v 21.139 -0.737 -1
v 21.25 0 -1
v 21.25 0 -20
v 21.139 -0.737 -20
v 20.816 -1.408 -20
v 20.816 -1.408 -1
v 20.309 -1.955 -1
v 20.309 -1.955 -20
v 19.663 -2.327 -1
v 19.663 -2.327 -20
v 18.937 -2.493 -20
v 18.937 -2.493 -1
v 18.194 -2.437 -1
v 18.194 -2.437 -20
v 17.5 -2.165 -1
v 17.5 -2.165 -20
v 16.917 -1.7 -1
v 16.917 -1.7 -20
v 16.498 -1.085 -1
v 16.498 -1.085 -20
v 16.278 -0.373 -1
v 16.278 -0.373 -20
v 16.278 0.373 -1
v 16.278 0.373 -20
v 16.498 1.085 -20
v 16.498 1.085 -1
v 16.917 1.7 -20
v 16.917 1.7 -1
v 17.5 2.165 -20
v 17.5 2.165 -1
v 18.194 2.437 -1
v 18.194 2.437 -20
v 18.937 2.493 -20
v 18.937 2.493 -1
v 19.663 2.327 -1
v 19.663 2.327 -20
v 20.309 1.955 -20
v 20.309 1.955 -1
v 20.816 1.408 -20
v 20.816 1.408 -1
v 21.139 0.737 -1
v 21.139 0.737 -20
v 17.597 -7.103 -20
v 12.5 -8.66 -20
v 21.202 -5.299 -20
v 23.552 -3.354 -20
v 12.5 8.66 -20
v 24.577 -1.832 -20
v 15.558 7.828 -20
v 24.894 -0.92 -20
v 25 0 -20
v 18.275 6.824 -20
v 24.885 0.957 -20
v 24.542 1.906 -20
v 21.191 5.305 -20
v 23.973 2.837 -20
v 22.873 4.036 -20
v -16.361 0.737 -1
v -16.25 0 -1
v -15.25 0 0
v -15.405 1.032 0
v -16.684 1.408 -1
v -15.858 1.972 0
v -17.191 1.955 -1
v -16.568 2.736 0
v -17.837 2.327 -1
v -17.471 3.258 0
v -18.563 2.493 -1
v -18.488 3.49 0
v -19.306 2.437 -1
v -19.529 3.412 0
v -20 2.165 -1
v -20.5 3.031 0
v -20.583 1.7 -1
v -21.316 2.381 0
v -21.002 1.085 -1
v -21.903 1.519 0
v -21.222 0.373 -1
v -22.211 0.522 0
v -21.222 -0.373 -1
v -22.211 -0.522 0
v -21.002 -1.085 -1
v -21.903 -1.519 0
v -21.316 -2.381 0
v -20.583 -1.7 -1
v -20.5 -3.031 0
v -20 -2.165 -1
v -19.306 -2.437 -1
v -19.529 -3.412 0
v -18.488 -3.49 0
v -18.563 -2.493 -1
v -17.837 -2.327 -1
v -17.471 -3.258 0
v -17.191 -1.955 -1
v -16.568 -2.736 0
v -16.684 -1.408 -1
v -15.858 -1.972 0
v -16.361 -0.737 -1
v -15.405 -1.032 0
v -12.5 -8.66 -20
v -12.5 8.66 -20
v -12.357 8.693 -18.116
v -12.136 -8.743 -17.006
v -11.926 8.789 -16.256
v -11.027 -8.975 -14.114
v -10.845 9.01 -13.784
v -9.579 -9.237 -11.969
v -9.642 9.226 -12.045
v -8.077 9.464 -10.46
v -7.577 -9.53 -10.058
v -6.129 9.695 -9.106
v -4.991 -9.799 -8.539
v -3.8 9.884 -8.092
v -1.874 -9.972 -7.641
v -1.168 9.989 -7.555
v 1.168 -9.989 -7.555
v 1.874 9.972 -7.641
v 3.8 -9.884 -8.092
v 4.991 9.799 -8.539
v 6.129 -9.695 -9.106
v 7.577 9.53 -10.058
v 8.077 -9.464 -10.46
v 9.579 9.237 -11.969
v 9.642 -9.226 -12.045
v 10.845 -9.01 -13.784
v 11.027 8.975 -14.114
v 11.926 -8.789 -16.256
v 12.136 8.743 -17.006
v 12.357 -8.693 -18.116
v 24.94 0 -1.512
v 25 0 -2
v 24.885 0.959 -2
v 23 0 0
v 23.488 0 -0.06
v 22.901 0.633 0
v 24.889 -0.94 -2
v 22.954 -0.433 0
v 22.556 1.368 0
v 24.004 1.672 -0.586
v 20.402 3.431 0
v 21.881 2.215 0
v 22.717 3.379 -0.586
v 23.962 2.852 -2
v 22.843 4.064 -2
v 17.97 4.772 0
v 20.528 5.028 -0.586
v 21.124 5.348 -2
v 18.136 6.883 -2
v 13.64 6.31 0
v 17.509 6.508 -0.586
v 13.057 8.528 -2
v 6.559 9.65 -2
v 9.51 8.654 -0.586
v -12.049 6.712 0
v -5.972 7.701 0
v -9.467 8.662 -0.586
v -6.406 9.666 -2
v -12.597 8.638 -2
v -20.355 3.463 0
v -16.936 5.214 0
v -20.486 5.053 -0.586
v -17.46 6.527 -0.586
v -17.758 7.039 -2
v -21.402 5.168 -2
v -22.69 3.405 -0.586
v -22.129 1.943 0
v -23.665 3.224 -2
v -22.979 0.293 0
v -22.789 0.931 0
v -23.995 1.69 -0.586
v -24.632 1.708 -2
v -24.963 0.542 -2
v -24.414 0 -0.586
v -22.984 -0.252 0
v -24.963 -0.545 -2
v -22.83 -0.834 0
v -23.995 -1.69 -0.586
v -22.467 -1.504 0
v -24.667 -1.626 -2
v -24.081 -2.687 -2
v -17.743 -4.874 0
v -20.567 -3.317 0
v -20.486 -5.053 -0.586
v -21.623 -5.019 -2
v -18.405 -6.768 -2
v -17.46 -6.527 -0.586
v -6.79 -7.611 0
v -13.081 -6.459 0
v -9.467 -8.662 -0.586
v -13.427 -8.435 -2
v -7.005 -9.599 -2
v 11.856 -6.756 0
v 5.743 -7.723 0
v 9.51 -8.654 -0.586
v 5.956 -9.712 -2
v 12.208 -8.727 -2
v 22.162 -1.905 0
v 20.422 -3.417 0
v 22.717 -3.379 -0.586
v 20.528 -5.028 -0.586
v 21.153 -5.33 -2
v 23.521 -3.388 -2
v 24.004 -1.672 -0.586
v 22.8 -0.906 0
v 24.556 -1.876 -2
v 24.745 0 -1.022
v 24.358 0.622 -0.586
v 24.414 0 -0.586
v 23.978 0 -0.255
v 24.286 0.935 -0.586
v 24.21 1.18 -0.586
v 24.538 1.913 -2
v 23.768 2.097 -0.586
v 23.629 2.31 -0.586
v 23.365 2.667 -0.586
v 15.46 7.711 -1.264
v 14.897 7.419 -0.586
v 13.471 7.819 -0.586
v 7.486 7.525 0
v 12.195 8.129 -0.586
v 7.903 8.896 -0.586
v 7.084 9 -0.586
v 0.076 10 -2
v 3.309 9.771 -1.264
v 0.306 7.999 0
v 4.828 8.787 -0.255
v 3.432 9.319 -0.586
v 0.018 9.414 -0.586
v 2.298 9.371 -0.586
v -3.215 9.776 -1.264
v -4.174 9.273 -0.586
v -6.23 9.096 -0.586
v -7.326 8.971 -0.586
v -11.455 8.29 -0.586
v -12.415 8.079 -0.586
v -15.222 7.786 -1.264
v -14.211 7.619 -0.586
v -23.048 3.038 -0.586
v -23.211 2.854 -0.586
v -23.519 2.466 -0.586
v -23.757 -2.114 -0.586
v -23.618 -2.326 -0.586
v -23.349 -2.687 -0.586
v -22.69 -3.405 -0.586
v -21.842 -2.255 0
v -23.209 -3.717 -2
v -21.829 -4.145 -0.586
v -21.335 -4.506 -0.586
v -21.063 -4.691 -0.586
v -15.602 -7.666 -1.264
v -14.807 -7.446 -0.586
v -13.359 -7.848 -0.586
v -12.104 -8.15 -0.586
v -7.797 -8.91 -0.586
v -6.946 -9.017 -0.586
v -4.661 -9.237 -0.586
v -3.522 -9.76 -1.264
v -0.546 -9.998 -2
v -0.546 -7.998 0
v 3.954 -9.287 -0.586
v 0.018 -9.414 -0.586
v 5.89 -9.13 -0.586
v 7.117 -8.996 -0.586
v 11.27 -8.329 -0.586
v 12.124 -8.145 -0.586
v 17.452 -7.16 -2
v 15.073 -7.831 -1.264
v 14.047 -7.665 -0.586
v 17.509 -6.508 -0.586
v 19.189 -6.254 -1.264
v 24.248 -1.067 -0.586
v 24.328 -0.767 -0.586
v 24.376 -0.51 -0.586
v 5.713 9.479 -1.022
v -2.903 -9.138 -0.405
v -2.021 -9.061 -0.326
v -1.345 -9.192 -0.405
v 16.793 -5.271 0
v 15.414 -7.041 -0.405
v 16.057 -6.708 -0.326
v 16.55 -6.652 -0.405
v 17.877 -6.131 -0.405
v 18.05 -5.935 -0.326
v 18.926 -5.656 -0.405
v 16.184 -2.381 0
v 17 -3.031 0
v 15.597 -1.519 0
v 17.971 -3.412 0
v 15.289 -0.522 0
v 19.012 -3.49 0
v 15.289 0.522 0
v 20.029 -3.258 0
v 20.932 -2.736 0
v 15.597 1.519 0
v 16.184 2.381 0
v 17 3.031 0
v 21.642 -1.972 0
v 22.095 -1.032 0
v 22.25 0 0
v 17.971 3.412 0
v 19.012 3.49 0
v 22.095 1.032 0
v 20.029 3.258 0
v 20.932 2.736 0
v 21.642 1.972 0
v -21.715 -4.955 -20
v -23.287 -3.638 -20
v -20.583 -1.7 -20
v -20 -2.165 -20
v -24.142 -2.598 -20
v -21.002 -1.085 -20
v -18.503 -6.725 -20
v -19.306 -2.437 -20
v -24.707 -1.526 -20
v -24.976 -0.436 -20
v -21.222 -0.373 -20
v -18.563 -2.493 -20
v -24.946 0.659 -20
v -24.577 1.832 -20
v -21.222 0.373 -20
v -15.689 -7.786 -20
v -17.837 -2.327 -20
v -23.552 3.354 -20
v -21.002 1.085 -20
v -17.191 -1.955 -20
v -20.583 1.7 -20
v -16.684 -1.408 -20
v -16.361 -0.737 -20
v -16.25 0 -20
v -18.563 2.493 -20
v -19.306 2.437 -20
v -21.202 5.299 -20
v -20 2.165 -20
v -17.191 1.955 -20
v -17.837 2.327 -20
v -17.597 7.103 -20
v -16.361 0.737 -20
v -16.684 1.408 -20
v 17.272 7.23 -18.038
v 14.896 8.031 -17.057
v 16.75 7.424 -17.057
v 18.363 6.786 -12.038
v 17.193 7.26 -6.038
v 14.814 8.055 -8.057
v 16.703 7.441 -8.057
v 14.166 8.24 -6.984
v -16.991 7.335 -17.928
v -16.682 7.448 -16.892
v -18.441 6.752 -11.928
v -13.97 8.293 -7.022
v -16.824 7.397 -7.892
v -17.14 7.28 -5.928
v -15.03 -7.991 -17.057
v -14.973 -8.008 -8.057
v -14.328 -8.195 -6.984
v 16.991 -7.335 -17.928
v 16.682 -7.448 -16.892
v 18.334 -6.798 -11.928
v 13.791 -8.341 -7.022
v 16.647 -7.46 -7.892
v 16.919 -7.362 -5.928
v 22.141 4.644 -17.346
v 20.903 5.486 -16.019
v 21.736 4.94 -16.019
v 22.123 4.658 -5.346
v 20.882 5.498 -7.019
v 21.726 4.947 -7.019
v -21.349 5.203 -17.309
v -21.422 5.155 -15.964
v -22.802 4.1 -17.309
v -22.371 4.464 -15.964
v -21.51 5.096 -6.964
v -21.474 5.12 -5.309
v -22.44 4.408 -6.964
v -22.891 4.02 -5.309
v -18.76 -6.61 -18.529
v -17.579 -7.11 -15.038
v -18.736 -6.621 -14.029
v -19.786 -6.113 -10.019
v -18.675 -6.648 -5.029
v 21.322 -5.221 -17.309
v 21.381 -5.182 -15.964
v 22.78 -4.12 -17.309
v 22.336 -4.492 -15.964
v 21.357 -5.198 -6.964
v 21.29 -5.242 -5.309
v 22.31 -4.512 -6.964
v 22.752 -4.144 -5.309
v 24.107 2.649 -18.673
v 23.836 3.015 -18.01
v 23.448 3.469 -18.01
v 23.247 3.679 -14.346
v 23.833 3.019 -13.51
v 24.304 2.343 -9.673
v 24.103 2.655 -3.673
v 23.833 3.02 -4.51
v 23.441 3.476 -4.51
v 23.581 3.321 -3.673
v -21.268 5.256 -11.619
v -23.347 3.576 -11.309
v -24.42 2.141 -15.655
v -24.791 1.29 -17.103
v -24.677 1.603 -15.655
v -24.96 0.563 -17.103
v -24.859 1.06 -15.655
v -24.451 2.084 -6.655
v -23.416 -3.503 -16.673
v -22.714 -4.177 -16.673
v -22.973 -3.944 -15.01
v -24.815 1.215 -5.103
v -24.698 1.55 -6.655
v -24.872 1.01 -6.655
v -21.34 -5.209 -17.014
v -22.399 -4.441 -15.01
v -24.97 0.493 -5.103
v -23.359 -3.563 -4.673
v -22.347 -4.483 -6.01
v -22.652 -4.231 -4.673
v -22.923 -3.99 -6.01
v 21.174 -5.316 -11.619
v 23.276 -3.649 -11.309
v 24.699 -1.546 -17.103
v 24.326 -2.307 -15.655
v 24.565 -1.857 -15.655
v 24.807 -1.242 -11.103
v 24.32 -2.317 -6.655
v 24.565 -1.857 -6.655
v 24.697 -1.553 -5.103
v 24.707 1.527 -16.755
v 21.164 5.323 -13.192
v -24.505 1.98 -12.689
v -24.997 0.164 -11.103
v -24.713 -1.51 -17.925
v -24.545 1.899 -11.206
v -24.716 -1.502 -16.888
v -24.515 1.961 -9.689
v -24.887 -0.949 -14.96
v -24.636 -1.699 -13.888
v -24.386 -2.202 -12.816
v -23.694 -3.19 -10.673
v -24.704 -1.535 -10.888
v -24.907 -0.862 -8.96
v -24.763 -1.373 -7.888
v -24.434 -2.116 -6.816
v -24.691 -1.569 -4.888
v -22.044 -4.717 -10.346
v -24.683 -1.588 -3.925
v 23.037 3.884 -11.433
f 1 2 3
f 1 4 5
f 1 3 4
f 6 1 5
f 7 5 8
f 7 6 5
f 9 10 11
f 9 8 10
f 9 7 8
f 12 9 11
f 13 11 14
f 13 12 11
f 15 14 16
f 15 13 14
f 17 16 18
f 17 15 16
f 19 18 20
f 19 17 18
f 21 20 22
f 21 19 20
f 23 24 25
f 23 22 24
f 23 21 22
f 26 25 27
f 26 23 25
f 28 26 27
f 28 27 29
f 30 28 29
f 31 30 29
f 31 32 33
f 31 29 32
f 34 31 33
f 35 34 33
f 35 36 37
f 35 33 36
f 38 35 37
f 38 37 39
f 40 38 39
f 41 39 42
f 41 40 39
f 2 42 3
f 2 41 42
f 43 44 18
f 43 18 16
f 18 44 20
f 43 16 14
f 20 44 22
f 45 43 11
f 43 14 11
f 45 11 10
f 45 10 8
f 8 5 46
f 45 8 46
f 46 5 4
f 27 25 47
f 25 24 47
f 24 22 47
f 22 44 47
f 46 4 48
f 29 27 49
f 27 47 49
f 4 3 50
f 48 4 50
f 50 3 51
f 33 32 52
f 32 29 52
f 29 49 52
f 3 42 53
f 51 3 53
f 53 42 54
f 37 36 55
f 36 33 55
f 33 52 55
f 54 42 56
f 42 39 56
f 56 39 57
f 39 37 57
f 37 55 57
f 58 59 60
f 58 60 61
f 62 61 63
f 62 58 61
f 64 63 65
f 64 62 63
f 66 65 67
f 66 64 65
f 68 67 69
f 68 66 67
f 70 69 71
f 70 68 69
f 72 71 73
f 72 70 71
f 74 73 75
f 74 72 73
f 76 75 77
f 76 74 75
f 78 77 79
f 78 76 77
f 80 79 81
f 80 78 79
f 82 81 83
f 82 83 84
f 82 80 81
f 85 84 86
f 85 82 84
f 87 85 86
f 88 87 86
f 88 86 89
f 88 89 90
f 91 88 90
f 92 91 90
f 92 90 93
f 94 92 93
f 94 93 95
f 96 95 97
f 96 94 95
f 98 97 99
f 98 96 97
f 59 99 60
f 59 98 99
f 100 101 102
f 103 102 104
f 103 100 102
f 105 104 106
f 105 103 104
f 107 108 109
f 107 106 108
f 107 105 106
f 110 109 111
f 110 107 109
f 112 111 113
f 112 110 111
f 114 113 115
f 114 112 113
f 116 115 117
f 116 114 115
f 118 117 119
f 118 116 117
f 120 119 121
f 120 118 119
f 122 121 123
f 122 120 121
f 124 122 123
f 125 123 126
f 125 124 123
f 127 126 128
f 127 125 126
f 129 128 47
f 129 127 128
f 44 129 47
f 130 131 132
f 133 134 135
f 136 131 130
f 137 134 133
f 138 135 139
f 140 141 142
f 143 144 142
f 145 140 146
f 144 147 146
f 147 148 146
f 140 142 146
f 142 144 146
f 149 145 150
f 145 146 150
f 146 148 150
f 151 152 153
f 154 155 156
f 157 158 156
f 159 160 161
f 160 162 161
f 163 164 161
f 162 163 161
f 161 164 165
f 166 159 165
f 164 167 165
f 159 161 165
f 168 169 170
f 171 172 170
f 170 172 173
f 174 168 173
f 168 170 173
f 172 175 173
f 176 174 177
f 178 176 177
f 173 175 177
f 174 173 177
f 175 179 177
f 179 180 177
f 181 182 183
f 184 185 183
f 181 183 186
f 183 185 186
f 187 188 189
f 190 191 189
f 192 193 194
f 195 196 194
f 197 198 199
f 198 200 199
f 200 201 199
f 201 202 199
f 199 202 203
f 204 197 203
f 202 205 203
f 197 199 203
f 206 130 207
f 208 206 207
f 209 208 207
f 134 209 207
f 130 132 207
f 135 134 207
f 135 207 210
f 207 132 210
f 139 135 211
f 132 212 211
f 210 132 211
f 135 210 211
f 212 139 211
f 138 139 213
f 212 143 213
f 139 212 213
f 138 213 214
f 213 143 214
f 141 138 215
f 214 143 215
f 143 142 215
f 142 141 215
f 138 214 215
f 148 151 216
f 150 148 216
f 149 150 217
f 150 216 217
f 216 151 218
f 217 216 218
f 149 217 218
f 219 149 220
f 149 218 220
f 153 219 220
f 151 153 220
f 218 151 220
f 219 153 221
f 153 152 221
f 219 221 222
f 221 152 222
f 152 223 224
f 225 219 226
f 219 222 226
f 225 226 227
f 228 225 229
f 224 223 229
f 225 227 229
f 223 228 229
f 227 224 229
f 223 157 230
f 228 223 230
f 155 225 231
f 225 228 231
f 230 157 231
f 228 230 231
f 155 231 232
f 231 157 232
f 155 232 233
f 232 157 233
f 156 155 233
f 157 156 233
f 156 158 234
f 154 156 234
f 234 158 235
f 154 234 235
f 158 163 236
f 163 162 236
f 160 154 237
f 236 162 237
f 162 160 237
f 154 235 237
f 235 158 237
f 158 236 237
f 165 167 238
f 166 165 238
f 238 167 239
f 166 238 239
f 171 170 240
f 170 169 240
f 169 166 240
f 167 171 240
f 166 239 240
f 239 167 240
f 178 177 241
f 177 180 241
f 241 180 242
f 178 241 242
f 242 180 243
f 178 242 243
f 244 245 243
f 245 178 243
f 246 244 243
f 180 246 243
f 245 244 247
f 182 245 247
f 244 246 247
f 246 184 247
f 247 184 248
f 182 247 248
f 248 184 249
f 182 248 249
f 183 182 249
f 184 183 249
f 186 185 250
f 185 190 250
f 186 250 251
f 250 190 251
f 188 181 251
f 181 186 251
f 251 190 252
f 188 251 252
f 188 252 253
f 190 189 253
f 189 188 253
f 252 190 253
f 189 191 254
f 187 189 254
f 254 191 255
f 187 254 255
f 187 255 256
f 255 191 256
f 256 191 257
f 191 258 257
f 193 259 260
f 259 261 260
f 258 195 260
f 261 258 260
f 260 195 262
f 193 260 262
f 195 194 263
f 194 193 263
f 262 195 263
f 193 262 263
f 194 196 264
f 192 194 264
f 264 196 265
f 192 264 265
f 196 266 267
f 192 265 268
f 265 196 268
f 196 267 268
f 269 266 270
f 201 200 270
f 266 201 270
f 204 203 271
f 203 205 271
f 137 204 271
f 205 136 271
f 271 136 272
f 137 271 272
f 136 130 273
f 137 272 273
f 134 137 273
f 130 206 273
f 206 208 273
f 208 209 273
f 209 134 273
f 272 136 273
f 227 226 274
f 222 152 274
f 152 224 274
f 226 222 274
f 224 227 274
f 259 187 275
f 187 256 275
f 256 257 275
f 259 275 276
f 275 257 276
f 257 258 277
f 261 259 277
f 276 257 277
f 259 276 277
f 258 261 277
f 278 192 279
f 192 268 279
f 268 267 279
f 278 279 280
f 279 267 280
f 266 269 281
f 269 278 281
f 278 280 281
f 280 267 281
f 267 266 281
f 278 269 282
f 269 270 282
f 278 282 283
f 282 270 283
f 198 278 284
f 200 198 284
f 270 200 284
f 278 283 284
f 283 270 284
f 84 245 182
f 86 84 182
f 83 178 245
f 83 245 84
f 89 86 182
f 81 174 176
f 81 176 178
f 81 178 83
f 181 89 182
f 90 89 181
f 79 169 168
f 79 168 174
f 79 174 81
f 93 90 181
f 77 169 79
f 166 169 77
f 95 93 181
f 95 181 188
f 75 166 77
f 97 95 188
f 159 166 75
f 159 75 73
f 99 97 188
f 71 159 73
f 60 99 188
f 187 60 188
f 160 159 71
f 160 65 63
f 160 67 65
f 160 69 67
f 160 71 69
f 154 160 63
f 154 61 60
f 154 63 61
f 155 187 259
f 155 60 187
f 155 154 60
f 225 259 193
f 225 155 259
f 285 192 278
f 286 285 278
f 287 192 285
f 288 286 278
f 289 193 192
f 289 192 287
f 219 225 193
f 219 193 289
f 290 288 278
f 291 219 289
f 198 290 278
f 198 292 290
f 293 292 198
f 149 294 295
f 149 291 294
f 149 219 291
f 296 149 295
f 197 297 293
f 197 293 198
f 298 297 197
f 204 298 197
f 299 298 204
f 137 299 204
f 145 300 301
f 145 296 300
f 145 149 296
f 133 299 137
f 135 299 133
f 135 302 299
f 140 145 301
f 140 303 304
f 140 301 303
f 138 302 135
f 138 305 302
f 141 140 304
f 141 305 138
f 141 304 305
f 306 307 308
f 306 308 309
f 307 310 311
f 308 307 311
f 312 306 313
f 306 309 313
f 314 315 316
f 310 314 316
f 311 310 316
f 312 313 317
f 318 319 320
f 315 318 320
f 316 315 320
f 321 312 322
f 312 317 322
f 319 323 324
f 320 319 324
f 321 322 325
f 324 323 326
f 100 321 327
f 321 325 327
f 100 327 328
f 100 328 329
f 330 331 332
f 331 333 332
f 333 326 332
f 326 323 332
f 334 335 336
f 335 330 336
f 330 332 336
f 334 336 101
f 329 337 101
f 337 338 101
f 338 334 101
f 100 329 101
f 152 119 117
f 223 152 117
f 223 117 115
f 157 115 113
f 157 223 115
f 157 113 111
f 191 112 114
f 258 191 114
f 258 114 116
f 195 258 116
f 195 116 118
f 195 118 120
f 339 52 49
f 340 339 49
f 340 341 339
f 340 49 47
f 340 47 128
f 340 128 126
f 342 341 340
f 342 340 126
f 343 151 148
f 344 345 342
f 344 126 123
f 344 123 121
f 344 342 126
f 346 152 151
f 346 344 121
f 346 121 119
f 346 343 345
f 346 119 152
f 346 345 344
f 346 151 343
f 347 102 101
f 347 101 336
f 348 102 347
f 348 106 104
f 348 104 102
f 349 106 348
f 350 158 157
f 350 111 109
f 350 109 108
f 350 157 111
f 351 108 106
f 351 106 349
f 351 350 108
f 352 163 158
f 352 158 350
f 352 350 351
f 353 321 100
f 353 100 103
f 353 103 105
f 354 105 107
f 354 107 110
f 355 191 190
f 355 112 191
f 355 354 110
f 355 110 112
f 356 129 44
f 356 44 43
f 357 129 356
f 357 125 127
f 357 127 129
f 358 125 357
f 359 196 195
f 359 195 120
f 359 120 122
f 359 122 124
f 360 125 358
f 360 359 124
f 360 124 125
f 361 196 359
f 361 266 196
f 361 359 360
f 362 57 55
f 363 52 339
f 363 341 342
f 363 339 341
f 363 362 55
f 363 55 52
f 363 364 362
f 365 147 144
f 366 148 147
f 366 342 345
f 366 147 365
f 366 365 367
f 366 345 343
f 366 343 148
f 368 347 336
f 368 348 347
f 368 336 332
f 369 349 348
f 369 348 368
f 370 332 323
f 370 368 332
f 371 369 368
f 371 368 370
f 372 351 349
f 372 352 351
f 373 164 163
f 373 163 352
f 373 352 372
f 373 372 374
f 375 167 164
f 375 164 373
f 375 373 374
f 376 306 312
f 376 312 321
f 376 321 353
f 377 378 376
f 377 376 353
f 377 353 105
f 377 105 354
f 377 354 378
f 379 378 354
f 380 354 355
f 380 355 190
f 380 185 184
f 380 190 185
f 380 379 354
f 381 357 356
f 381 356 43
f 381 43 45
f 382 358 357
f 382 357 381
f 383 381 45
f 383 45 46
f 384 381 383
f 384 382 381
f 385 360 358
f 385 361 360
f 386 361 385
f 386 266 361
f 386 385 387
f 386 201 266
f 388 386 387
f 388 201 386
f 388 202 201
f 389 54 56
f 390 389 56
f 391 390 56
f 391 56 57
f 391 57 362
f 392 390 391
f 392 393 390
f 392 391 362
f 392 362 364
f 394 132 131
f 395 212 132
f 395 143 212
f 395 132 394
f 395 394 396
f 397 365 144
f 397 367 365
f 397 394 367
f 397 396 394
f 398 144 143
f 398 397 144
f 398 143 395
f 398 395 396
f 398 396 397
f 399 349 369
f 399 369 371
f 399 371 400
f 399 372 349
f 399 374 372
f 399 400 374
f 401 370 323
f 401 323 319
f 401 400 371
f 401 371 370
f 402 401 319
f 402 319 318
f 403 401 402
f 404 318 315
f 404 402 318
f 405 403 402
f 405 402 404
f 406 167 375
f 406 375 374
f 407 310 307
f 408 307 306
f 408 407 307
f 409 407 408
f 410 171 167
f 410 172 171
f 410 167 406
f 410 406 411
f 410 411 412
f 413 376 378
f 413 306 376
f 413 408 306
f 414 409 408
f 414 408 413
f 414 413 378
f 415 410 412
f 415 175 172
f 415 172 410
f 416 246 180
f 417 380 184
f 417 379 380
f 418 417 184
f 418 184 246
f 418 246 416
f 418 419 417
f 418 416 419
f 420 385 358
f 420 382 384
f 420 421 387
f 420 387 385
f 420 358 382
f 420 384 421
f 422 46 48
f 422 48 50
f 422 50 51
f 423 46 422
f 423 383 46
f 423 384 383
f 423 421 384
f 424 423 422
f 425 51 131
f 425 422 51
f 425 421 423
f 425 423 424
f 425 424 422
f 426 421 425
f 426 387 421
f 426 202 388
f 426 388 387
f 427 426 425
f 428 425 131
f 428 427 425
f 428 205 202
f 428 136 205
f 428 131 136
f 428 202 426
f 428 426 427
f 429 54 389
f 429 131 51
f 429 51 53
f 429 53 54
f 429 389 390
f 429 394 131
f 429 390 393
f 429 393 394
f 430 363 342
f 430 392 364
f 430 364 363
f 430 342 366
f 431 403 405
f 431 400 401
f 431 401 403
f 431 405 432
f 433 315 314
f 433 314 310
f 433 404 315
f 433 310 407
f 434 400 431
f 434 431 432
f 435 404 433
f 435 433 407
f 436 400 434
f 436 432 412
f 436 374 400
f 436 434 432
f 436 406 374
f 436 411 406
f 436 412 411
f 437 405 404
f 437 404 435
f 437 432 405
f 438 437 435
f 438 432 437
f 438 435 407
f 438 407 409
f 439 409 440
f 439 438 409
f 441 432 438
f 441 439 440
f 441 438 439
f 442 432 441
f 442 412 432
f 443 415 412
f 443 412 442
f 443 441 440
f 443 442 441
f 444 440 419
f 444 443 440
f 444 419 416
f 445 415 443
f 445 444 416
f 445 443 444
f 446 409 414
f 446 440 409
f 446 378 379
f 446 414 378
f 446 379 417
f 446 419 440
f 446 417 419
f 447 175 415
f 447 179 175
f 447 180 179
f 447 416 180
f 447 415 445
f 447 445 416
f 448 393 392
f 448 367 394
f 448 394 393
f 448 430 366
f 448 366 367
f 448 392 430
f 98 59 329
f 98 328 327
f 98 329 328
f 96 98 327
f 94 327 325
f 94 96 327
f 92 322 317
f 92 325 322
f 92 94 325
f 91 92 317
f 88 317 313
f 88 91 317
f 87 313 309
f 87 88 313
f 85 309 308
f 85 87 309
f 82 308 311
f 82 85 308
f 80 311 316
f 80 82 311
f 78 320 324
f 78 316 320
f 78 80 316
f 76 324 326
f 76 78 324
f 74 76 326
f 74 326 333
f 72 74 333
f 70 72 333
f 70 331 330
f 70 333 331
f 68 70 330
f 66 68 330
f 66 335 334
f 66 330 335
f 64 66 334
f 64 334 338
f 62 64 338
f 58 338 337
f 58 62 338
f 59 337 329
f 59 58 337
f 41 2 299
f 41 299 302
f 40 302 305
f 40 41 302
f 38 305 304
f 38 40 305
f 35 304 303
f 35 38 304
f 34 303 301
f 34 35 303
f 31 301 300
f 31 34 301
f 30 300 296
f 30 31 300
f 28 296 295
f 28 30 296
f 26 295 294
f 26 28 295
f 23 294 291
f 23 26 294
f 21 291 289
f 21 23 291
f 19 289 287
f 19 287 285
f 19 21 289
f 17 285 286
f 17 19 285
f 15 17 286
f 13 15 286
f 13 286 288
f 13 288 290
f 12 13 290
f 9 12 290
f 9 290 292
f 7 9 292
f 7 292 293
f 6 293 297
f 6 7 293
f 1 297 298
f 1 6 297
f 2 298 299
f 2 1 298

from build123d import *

# Parameters (mm, degrees)
SKETCH2_RX              = 25
SKETCH2_RY              = 10
BOSS_EXTRUDE1_DEPTH     = 20
CUT_EXTRUDE1_DEPTH      = 34.541019662
CUT_EXTRUDE1_DEPTH_BACK = 34.541019662
SKETCH3_R               = 12.5
FILLET2_R               = 2
CUT_EXTRUDE3_DEPTH      = 34.541019826
CUT_EXTRUDE3_DEPTH_BACK = 34.541019826
SKETCH5_R               = 2.5
CHAMFER1_SIZE           = 1


with BuildPart() as part:
    # Sketch2 → Boss-Extrude1 (new body)
    with BuildSketch(Plane(origin=(0, 0, 0), x_dir=(0, 1, 0), z_dir=(0, 0, 1))):
        with Locations(Location((0, 0), (0, 0, -90))):
            Ellipse(SKETCH2_RX, SKETCH2_RY)
    extrude(amount=-BOSS_EXTRUDE1_DEPTH)

    # Sketch3 → Cut-Extrude1 (cut, two sides: drawn at the far end of the back side and taken through both)
    with BuildSketch(Plane(origin=(0, 0, 0), x_dir=(-1, 0, 0), z_dir=(0, 1, 0)).offset(-CUT_EXTRUDE1_DEPTH_BACK)):
        with Locations((0, -20)):
            Circle(SKETCH3_R)
    extrude(amount=CUT_EXTRUDE1_DEPTH + CUT_EXTRUDE1_DEPTH_BACK, mode=Mode.SUBTRACT)

    # Fillet2
    fillet2_edges = [part.edges().sort_by_distance(p)[0] for p in [
        (-24.996691196, -0.162691976, 0),
    ]]
    fillet(fillet2_edges, radius=FILLET2_R)

    # Sketch5 → Cut-Extrude3 (cut, two sides: drawn at the far end of the back side and taken through both)
    with BuildSketch(Plane(origin=(0, 0, 0), x_dir=(1, 0, 0), z_dir=(0, 0, -1)).offset(-CUT_EXTRUDE3_DEPTH_BACK)):
        with Locations((-18.75, 0)):
            Circle(SKETCH5_R)
        with Locations((18.75, 0)):
            Circle(SKETCH5_R)
    extrude(amount=CUT_EXTRUDE3_DEPTH + CUT_EXTRUDE3_DEPTH_BACK, mode=Mode.SUBTRACT)

    # Chamfer1
    chamfer1_edges = [part.edges().sort_by_distance(p)[0] for p in [
        (-21.25, 0, 0),
        (16.25, 0, 0),
    ]]
    chamfer(chamfer1_edges, length=CHAMFER1_SIZE)


solid = part.part
